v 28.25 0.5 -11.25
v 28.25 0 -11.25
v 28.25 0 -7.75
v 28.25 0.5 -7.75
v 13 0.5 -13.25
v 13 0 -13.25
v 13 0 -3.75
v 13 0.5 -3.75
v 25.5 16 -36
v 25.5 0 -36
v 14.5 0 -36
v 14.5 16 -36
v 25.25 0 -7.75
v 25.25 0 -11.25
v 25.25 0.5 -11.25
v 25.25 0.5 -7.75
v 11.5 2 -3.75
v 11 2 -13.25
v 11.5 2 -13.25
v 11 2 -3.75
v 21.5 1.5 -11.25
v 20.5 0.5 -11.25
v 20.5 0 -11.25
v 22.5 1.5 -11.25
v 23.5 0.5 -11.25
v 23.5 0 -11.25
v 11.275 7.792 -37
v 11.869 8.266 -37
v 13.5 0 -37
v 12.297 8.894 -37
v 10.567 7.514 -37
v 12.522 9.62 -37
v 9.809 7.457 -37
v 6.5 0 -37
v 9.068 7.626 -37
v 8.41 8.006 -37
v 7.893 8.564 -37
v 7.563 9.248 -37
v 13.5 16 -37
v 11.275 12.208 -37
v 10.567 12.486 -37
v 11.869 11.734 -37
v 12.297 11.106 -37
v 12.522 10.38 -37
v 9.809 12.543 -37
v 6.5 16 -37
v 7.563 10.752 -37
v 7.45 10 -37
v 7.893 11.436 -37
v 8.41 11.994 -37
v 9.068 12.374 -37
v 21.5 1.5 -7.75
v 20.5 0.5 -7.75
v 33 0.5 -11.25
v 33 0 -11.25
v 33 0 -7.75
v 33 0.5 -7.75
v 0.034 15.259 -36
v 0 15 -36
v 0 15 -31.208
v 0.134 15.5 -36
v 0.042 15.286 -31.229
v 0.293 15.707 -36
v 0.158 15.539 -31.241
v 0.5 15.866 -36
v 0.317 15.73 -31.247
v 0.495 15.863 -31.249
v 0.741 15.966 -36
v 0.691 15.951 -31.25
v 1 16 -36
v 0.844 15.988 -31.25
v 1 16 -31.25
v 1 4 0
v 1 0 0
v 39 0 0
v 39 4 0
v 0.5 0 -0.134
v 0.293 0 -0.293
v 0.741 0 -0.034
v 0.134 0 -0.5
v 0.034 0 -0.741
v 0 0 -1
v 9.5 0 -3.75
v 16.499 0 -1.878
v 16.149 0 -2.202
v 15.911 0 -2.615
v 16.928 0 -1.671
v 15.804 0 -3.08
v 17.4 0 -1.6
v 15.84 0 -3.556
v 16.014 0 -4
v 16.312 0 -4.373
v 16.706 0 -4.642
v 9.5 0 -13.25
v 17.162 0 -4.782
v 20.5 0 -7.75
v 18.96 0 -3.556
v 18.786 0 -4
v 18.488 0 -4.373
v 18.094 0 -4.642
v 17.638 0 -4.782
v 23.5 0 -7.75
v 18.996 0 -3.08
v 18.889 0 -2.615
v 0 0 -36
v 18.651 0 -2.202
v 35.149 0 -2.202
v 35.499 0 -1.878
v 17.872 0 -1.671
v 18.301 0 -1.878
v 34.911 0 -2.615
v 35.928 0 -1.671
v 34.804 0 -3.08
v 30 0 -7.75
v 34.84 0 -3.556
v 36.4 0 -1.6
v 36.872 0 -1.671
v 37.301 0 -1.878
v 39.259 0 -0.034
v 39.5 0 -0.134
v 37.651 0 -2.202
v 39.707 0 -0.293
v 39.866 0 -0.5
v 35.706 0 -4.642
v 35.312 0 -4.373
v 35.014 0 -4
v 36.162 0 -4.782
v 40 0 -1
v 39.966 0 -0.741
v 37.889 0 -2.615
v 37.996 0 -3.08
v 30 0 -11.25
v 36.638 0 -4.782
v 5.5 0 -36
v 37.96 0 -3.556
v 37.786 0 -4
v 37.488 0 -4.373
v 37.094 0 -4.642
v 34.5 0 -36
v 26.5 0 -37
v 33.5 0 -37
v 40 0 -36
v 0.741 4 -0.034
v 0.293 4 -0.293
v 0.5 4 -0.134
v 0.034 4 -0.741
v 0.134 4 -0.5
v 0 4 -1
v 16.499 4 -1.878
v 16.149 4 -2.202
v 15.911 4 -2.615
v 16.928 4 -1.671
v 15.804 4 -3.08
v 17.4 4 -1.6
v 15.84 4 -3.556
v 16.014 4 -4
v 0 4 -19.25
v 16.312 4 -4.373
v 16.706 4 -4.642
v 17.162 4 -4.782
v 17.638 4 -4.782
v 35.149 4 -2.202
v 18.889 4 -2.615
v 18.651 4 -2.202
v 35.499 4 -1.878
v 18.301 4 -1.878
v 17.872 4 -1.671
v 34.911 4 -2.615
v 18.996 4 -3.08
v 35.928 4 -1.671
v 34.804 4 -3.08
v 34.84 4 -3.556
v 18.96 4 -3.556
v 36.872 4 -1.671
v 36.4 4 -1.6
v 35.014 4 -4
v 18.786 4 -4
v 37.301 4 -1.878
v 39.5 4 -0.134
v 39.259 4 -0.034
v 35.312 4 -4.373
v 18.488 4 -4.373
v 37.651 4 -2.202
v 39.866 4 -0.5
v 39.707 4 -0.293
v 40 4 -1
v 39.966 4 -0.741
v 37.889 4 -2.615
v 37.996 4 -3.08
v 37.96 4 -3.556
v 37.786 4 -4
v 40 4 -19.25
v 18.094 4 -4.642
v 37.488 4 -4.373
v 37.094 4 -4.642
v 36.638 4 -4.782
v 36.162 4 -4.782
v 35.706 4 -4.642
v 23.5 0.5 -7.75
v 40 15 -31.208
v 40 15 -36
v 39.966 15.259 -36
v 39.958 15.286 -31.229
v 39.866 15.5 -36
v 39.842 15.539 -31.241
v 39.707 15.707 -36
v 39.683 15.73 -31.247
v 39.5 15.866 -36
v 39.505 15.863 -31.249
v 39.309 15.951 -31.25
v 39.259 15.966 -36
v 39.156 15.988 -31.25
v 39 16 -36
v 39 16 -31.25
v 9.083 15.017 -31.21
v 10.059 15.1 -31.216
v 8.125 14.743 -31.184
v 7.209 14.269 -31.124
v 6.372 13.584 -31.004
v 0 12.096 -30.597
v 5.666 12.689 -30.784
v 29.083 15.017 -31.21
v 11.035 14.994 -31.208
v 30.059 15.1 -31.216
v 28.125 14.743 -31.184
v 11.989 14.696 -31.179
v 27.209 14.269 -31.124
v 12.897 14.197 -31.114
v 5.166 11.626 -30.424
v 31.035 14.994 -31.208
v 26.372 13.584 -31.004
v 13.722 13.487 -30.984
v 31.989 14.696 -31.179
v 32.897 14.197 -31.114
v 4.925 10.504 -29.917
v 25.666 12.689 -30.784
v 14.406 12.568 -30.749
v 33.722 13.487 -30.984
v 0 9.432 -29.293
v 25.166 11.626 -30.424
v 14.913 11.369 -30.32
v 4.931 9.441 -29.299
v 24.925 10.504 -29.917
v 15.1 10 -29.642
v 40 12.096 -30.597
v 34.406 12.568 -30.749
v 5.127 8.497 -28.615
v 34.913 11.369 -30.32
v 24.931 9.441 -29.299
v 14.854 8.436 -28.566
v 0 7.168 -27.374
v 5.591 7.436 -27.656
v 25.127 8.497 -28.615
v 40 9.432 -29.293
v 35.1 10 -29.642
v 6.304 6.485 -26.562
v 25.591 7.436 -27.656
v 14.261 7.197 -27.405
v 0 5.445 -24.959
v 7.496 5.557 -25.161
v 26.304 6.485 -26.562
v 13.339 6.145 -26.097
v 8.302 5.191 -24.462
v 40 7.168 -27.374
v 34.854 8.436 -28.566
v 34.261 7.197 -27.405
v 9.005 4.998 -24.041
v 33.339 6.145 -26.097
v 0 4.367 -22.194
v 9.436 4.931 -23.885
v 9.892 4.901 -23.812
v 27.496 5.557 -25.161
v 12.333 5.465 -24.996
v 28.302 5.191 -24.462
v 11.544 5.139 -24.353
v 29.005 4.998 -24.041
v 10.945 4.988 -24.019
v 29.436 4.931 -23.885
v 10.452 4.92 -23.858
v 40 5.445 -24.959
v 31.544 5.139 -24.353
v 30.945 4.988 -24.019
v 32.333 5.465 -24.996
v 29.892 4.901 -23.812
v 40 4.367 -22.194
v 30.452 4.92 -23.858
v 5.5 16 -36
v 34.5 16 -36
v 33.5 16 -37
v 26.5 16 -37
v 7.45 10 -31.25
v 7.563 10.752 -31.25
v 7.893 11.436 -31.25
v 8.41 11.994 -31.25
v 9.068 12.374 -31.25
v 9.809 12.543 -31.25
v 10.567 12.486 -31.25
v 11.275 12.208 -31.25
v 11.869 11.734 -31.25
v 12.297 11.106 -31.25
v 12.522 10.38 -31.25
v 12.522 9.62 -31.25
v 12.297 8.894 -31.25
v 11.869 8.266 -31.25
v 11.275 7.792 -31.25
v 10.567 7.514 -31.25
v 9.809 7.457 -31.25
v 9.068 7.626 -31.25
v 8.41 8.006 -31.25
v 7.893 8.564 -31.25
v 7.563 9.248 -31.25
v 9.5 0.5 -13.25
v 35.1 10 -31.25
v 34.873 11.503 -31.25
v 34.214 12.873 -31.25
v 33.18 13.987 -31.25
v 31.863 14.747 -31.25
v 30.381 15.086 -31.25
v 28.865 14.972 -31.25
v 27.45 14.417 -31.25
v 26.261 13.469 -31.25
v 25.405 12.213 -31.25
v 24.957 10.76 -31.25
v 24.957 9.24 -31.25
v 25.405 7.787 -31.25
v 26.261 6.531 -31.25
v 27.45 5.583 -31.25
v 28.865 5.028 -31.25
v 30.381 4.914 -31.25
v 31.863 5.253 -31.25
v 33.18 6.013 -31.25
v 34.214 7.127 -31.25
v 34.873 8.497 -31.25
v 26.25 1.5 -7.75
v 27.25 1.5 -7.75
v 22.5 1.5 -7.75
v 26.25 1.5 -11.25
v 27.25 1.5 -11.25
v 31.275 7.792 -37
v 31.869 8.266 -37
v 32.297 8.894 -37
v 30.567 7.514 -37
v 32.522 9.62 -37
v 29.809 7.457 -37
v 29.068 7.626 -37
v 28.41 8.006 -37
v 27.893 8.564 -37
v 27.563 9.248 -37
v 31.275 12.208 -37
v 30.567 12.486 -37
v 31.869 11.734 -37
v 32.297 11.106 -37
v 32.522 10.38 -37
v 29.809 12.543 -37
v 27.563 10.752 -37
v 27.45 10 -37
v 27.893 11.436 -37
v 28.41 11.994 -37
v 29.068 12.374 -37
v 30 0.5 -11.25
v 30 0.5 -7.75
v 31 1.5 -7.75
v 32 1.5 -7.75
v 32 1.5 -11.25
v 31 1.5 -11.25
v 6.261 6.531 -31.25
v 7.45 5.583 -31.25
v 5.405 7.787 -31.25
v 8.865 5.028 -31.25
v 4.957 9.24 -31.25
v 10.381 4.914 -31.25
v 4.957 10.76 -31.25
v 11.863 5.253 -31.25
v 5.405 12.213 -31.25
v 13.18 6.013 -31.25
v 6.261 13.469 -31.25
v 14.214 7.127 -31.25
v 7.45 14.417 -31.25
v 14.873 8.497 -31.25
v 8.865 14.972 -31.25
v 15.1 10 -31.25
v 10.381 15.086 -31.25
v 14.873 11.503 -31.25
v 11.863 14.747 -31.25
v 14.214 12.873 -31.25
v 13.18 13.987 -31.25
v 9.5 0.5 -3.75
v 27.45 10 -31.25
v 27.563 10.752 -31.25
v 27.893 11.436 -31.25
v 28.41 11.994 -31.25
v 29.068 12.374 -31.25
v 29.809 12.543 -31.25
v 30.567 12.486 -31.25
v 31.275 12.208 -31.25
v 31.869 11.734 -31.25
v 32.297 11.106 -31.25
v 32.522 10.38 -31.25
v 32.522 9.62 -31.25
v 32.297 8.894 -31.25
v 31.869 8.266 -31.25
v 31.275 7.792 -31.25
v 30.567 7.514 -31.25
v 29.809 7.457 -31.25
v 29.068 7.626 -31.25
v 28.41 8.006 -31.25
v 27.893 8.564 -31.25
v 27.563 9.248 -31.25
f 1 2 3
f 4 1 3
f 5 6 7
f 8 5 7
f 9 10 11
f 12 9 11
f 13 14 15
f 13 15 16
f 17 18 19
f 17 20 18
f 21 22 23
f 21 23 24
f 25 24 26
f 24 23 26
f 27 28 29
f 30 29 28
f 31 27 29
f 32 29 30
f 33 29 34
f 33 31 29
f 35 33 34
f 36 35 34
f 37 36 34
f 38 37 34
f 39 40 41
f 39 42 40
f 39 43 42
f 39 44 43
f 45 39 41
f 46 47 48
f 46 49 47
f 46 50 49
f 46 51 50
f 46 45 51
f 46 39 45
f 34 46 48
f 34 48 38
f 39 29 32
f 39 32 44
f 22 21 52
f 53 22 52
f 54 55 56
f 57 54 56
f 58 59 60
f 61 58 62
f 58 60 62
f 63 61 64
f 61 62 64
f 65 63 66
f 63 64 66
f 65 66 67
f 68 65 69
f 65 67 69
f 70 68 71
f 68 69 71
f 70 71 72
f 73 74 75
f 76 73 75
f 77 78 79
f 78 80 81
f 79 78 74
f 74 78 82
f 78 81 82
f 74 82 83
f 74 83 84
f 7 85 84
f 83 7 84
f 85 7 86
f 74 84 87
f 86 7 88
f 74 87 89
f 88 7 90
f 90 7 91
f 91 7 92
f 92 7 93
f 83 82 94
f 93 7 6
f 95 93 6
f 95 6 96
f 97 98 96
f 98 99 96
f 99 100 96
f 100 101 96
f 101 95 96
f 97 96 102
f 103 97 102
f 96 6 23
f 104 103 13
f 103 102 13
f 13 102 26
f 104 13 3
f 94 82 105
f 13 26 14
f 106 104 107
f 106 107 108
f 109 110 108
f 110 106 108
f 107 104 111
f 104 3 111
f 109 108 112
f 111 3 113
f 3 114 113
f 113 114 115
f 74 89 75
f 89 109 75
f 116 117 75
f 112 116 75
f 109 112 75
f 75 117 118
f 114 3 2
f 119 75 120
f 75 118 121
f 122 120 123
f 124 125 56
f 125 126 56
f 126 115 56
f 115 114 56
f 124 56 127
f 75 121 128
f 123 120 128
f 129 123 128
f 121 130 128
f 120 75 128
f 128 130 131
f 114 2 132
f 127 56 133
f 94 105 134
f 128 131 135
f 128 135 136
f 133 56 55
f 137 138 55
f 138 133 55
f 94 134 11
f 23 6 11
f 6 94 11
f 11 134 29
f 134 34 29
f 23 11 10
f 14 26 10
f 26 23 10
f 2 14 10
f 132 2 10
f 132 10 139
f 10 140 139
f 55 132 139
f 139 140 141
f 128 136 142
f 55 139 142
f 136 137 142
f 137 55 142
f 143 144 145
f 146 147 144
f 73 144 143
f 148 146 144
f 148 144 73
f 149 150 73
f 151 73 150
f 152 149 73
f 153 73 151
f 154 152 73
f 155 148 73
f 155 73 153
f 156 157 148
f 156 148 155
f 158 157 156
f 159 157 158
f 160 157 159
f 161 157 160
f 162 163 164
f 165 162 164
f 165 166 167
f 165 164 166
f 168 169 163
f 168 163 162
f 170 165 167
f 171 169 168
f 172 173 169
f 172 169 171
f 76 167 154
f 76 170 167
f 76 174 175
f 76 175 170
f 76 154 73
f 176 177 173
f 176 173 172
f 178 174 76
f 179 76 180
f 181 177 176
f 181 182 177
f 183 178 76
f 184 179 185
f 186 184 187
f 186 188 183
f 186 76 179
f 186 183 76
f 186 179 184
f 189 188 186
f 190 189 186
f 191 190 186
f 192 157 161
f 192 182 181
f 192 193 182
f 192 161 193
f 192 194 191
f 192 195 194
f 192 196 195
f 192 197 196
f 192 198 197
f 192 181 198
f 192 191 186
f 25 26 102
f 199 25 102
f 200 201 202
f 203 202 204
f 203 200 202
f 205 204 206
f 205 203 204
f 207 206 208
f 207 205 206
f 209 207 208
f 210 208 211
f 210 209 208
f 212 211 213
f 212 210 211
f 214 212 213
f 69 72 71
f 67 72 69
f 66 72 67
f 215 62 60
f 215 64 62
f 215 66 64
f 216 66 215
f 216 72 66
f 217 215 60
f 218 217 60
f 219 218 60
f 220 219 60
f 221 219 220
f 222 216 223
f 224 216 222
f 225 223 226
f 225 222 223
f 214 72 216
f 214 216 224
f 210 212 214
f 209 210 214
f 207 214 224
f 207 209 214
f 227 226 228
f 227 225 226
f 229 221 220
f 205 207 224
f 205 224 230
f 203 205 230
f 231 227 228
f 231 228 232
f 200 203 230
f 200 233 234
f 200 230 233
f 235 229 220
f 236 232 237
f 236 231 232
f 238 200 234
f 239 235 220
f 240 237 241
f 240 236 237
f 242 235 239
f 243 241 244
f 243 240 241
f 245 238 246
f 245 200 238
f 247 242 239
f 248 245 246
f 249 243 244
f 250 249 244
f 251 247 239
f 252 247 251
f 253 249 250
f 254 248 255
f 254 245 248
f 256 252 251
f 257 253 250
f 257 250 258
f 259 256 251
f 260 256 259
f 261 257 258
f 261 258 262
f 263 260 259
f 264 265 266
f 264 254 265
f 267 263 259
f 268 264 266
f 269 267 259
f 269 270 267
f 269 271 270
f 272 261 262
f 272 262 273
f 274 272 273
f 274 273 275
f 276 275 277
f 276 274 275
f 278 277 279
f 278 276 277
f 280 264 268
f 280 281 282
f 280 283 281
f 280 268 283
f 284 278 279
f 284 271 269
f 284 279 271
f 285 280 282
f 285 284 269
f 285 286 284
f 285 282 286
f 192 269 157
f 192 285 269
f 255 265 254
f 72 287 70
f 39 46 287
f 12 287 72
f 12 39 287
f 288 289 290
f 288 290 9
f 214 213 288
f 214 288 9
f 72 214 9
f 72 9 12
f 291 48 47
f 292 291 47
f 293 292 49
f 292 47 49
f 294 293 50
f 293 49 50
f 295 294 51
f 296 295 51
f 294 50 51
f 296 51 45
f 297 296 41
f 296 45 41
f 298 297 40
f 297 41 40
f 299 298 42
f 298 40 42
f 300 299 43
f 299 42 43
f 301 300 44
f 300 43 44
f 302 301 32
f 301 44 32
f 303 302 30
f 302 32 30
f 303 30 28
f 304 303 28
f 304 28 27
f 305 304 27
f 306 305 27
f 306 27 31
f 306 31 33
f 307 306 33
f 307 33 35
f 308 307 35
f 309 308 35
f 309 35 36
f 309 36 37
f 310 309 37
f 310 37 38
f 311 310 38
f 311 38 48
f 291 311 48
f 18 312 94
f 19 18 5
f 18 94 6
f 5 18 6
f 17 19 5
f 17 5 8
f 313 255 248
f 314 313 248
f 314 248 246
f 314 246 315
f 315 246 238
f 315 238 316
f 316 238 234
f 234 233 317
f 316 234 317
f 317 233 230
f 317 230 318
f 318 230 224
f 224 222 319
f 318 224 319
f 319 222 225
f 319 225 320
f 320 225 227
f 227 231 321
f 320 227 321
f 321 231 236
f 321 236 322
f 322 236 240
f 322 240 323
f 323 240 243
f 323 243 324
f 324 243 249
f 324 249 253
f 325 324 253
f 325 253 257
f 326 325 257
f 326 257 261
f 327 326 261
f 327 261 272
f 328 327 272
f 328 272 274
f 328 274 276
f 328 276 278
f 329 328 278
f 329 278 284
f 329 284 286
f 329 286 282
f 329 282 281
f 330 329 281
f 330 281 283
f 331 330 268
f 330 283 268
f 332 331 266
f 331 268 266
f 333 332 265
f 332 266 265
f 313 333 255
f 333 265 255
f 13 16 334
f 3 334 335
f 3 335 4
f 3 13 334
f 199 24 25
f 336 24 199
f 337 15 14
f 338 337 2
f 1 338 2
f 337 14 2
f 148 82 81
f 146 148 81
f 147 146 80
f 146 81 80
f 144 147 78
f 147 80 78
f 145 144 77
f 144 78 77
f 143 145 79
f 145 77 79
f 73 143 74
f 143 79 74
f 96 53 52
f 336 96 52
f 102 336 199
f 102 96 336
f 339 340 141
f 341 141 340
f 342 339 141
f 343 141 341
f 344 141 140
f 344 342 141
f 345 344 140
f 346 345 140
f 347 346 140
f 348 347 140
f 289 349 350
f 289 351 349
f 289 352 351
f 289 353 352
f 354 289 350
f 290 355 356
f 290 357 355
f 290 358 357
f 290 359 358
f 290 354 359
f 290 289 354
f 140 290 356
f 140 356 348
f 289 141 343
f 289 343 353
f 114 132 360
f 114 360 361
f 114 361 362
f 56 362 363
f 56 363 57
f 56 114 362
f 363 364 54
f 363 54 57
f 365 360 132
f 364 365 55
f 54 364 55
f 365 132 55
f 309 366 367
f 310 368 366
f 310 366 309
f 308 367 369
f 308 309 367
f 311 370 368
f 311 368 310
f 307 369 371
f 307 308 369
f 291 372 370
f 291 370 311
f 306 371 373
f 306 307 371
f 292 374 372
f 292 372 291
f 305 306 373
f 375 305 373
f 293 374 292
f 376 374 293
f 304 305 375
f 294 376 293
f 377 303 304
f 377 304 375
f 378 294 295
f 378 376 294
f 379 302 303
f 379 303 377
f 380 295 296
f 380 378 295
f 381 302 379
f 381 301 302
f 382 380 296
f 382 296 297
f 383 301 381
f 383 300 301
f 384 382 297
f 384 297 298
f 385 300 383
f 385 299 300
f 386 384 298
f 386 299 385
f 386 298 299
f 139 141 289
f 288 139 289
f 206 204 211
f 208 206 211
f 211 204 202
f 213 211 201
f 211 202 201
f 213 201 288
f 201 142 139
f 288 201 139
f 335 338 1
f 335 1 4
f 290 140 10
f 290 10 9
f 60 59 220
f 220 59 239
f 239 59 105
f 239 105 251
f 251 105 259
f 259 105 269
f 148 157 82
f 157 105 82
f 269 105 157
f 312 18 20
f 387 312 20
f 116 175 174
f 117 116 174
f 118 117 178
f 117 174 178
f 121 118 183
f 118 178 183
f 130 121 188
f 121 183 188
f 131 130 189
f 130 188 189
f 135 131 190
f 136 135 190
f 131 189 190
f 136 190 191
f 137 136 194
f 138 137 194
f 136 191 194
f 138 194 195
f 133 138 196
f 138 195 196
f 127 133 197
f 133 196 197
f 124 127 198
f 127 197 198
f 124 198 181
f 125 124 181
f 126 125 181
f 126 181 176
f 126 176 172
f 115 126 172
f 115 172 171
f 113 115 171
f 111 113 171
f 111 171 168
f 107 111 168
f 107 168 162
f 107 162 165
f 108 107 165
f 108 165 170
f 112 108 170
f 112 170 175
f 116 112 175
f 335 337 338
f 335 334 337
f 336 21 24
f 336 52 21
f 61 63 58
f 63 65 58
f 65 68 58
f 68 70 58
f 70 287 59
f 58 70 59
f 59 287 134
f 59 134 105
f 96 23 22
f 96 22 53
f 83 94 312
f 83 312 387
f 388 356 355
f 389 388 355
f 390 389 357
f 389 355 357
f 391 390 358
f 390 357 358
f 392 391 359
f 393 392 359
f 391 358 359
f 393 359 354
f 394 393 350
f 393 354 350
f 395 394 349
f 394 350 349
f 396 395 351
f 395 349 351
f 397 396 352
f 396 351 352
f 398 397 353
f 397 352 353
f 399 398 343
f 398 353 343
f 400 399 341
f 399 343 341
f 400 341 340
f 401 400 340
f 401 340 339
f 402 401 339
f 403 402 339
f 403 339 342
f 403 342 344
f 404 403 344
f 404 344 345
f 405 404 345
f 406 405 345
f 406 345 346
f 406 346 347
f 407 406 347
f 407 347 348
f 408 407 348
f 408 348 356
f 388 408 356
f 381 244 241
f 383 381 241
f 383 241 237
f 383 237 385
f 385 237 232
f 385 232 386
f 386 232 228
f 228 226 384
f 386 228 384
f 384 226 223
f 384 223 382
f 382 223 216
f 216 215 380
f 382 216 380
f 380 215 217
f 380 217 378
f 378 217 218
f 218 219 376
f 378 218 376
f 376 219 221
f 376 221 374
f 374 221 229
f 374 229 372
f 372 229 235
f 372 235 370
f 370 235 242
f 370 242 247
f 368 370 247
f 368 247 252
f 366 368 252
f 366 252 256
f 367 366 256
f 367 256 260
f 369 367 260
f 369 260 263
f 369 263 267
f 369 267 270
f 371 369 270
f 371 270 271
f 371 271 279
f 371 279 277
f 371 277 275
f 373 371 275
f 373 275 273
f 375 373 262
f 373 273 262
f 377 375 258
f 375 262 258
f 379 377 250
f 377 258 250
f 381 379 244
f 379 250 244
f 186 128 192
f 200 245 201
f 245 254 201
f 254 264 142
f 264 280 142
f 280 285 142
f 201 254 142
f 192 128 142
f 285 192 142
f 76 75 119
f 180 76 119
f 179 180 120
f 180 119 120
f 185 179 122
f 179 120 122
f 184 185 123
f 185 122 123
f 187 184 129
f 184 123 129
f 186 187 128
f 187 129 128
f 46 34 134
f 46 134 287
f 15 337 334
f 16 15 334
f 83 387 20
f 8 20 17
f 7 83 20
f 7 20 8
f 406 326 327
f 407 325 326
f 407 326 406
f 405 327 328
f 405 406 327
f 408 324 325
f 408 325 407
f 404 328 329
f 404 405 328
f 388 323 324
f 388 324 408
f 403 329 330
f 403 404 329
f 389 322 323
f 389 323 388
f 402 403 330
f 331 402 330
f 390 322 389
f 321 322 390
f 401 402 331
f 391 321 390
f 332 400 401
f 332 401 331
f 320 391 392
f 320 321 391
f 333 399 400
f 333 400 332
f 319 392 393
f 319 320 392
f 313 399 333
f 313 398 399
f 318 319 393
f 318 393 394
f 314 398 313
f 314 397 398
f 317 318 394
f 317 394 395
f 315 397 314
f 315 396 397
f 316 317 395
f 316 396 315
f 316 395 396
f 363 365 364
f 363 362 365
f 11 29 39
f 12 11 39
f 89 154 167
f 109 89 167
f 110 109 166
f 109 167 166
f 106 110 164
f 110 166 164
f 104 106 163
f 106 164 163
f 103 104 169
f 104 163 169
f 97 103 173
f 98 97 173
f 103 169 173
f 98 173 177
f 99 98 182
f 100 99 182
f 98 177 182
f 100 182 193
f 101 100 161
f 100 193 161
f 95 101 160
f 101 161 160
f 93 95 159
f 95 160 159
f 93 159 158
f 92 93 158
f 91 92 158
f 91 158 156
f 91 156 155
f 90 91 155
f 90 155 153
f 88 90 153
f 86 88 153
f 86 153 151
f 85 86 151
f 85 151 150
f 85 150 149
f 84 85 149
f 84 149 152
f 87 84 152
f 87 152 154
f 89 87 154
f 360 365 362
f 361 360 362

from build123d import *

# Parameters (mm, degrees)
BOSS_EXTRUDE1_DEPTH = 4
BOSS_EXTRUDE2_DEPTH = 40
SKETCH3_W           = 9
SKETCH3_H           = 16
BOSS_EXTRUDE3_DEPTH = 1
CHAMFER1_SIZE       = 1
SKETCH4_R           = 5.1
CUT_EXTRUDE1_DEPTH  = 31.25
CUT_EXTRUDE2_REACH  = 58.789
SKETCH5_R           = 2.55
FILLET1_R           = 1
SKETCH6_R           = 1.6
CUT_EXTRUDE3_DEPTH  = 56.794265031
SKETCH7_W           = 3
SKETCH7_H           = 3.5
CUT_EXTRUDE4_DEPTH  = 1.5
CHAMFER2_SIZE       = 1
SKETCH8_W           = 3.5
SKETCH8_H           = 9.5
CUT_EXTRUDE5_DEPTH  = 2
CHAMFER3_SIZE       = 1.5


with BuildPart() as part:
    # Sketch1 → Boss-Extrude1 (new body)
    with BuildSketch(Plane(origin=(0, 0, 0), x_dir=(1, 0, 0), z_dir=(0, 1, 0))):
        with BuildLine():
            Line((1, 0), (39, 0))
            ThreePointArc((39, 0), (39.707106781, 0.292893219), (40, 1))
            Line((40, 1), (40, 36))
            Line((40, 36), (0, 36))
            Line((0, 36), (0, 1))
            ThreePointArc((0, 1), (0.292893219, 0.292893219), (1, 0))
        make_face()
    extrude(amount=BOSS_EXTRUDE1_DEPTH)

    # Sketch2 → Boss-Extrude2 (add, through all)
    with BuildSketch(Plane(origin=(40, 0, 0), x_dir=(0, 0, -1), z_dir=(1, 0, 0))):
        with BuildLine():
            Line((36, 0), (36, 16))
            Line((36, 16), (31.25, 16))
            ThreePointArc((31.25, 16), (27.735281374, 7.514718626), (19.25, 4))
            Line((19.25, 4), (19.25, 0))
            Line((19.25, 0), (36, 0))
        make_face()
    extrude(amount=-BOSS_EXTRUDE2_DEPTH)

    # Sketch3 → Boss-Extrude3 (add)
    with BuildSketch(Plane(origin=(0, 0, -36), x_dir=(-1, 0, 0), z_dir=(0, 0, -1))):
        with Locations((-30, 8)):
            Rectangle(SKETCH3_W, SKETCH3_H)
        with Locations((-10, 8)):
            Rectangle(SKETCH3_W, SKETCH3_H)
    extrude(amount=BOSS_EXTRUDE3_DEPTH)

    # Chamfer1
    chamfer1_edges = [part.edges().sort_by_distance(p)[0] for p in [
        (25.5, 8, -37),
        (34.5, 8, -37),
        (14.5, 8, -37),
        (5.5, 8, -37),
    ]]
    chamfer(chamfer1_edges, length=CHAMFER1_SIZE - 0.0001)  # a hair under: the kernel refuses the full size

    # Sketch4 → Cut-Extrude1 (cut)
    with BuildSketch(Plane.XY):
        with Locations((10, 10)):
            Circle(SKETCH4_R)
        with Locations((30, 10)):
            Circle(SKETCH4_R)
    extrude(amount=-CUT_EXTRUDE1_DEPTH, mode=Mode.SUBTRACT)

    # Sketch5 → Cut-Extrude2 (cut, up to next)
    with BuildSketch(Plane(origin=(0, 0, -37), x_dir=(-1, 0, 0), z_dir=(0, 0, -1)), mode=Mode.PRIVATE) as cut_extrude2_sk1:
        with Locations((-30, 10)):
            Circle(SKETCH5_R)
    cut_extrude2_tool1 = extrude(cut_extrude2_sk1.sketch, amount=-CUT_EXTRUDE2_REACH, mode=Mode.PRIVATE) & part.part
    # Sketch5 → Cut-Extrude2 (cut, up to next)
    with BuildSketch(Plane(origin=(0, 0, -37), x_dir=(-1, 0, 0), z_dir=(0, 0, -1)), mode=Mode.PRIVATE) as cut_extrude2_sk2:
        with Locations((-10, 10)):
            Circle(SKETCH5_R)
    cut_extrude2_tool2 = extrude(cut_extrude2_sk2.sketch, amount=-CUT_EXTRUDE2_REACH, mode=Mode.PRIVATE) & part.part
    add(cut_extrude2_tool1.solids().sort_by_distance((30, 10, -37))[0], mode=Mode.SUBTRACT)
    add(cut_extrude2_tool2.solids().sort_by_distance((10, 10, -37))[0], mode=Mode.SUBTRACT)

    # Fillet1
    fillet1_edges = [part.edges().sort_by_distance(p)[0] for p in [
        (0, 16, -33.625),
        (40, 16, -33.625),
    ]]
    fillet(fillet1_edges, radius=FILLET1_R)

    # Sketch6 → Cut-Extrude3 (cut, through all)
    with BuildSketch(Plane(origin=(0, 4, 0), x_dir=(1, 0, 0), z_dir=(0, 1, 0))):
        with Locations(Location((36.4, 3.2, 0), (0, 0, 270))):
            Circle(SKETCH6_R)
        with Locations(Location((17.4, 3.2, 0), (0, 0, 270))):
            Circle(SKETCH6_R)
    extrude(amount=-CUT_EXTRUDE3_DEPTH, mode=Mode.SUBTRACT)

    # Sketch7 → Cut-Extrude4 (cut)
    with BuildSketch(Plane.XZ):
        with Locations((31.5, -9.5)):
            Rectangle(SKETCH7_W, SKETCH7_H)
        with Locations((26.75, -9.5)):
            Rectangle(SKETCH7_W, SKETCH7_H)
        with Locations((22, -9.5)):
            Rectangle(SKETCH7_W, SKETCH7_H)
    extrude(amount=-CUT_EXTRUDE4_DEPTH, mode=Mode.SUBTRACT)

    # Chamfer2
    chamfer2_edges = [part.edges().sort_by_distance(p)[0] for p in [
        (33, 1.5, -9.5),
        (30, 1.5, -9.5),
        (28.25, 1.5, -9.5),
        (25.25, 1.5, -9.5),
        (23.5, 1.5, -9.5),
        (20.5, 1.5, -9.5),
    ]]
    chamfer(chamfer2_edges, length=CHAMFER2_SIZE)

    # Sketch8 → Cut-Extrude5 (cut)
    with BuildSketch(Plane.XZ):
        with Locations((11.25, -8.5)):
            Rectangle(SKETCH8_W, SKETCH8_H)
    extrude(amount=-CUT_EXTRUDE5_DEPTH, mode=Mode.SUBTRACT)

    # Chamfer3
    chamfer3_edges = [part.edges().sort_by_distance(p)[0] for p in [
        (9.5, 2, -8.5),
        (13, 2, -8.5),
    ]]
    chamfer(chamfer3_edges, length=CHAMFER3_SIZE)


solid = part.part
